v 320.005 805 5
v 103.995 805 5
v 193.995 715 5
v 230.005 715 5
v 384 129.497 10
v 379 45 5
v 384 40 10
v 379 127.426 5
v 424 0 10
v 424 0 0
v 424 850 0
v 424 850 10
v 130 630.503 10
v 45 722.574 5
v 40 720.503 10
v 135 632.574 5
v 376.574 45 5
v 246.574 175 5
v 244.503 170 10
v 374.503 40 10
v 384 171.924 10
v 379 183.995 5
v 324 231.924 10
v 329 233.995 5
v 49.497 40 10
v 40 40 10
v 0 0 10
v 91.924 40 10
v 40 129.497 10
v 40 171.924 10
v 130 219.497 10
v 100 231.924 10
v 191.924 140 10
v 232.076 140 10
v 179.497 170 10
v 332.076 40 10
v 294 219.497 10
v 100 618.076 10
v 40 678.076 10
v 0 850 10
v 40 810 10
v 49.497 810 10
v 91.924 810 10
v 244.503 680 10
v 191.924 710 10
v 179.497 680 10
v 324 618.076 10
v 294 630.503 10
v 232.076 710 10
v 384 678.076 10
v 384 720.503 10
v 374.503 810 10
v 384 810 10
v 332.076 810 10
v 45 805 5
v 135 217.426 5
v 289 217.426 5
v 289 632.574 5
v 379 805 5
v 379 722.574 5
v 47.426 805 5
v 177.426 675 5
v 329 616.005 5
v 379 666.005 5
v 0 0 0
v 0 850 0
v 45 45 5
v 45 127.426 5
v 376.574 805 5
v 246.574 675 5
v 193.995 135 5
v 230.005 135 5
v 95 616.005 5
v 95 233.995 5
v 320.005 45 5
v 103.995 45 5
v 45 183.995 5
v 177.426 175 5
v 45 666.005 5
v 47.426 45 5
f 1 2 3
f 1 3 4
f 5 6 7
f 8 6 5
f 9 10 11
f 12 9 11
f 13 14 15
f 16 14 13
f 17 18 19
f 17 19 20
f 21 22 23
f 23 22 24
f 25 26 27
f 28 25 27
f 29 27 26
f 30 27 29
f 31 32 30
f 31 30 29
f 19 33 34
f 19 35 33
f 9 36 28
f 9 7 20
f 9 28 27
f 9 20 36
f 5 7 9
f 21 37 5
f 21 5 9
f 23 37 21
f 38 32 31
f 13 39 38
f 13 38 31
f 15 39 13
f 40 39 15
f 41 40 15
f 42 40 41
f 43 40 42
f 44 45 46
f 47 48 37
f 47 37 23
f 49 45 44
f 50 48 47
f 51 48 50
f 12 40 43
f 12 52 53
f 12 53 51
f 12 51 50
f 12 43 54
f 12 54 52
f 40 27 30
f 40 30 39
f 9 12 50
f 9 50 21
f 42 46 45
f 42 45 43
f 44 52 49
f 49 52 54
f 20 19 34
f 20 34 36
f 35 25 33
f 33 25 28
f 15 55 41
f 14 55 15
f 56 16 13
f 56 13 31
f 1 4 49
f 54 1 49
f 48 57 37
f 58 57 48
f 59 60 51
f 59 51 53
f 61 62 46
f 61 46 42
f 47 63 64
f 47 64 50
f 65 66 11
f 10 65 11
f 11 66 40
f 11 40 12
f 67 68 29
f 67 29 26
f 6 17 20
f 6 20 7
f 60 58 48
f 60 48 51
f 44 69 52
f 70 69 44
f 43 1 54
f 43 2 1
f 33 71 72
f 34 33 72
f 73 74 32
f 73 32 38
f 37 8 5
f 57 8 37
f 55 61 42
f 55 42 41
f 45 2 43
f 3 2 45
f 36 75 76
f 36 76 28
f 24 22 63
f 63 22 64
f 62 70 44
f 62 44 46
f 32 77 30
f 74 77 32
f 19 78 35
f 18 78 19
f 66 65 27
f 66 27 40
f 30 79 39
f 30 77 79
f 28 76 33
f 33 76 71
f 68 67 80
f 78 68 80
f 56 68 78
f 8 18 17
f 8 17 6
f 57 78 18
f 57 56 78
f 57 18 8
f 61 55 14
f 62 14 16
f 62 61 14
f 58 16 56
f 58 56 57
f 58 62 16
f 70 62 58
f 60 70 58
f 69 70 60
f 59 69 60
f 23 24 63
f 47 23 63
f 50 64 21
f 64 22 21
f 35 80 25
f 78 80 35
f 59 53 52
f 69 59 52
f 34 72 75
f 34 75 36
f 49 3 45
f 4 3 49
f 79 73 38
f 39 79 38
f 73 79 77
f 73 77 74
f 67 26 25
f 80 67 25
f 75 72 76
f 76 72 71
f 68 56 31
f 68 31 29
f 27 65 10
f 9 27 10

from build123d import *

# Parameters (mm, degrees)
ESQUISSE1_W             = 424
ESQUISSE1_H             = 850
BOSS_EXTRU_1_DEPTH      = 10
ENL_V_MAT_EXTRU_1_DEPTH = 5
CHANFREIN1_SIZE         = 5


with BuildPart() as part:
    # Esquisse1 → Boss.-Extru.1 (new body)
    with BuildSketch(Plane.XY):
        with Locations((212, 425)):
            Rectangle(ESQUISSE1_W, ESQUISSE1_H)
    extrude(amount=BOSS_EXTRU_1_DEPTH)

    # Esquisse2 → Enlèv. mat.-Extru.1 (cut)
    with BuildSketch(Plane.XY.offset(10)):
        Polygon((100, 231.923881554), (100, 618.076118446), (40, 678.076118446), (40, 171.923881554), align=None)
        Polygon((191.923881554, 710), (232.076118446, 710), (332.076118446, 810), (91.923881554, 810), align=None)
        Polygon((40, 810), (40, 720.502525317), (130, 630.502525317), (130, 219.497474683), (40, 129.497474683), (40, 40), (49.497474683, 40), (179.497474683, 170), (244.502525317, 170), (374.502525317, 40), (384, 40), (384, 129.497474683), (294, 219.497474683), (294, 630.502525317), (384, 720.502525317), (384, 810), (374.502525317, 810), (244.502525317, 680), (179.497474683, 680), (49.497474683, 810), align=None)
        Polygon((324, 231.923881554), (324, 618.076118446), (384, 678.076118446), (384, 171.923881554), align=None)
        Polygon((332.076118446, 40), (91.923881554, 40), (191.923881554, 140), (232.076118446, 140), align=None)
    extrude(amount=-ENL_V_MAT_EXTRU_1_DEPTH, mode=Mode.SUBTRACT)

    # Chanfrein1
    chanfrein1_edges = [part.edges().sort_by_distance(p)[0] for p in [
        (212, 40, 5),
        (141.923881554, 90, 5),
        (212, 140, 5),
        (282.076118446, 90, 5),
        (40, 425, 5),
        (70, 648.076118446, 5),
        (100, 425, 5),
        (70, 201.923881554, 5),
        (384, 425, 5),
        (354, 201.923881554, 5),
        (324, 425, 5),
        (354, 648.076118446, 5),
        (114.497474683, 745, 5),
        (212, 680, 5),
        (309.502525317, 745, 5),
        (379.251262658, 810, 5),
        (384, 765.251262658, 5),
        (339, 675.502525317, 5),
        (294, 425, 5),
        (339, 174.497474683, 5),
        (384, 84.748737342, 5),
        (379.251262658, 40, 5),
        (309.502525317, 105, 5),
        (212, 170, 5),
        (114.497474683, 105, 5),
        (44.748737342, 40, 5),
        (40, 84.748737342, 5),
        (85, 174.497474683, 5),
        (130, 425, 5),
        (85, 675.502525317, 5),
        (40, 765.251262658, 5),
        (44.748737342, 810, 5),
        (212, 810, 5),
        (282.076118446, 760, 5),
        (212, 710, 5),
        (141.923881554, 760, 5),
    ]]
    chamfer(chanfrein1_edges, length=CHANFREIN1_SIZE - 0.0001)  # a hair under: the kernel refuses the full size


solid = part.part
